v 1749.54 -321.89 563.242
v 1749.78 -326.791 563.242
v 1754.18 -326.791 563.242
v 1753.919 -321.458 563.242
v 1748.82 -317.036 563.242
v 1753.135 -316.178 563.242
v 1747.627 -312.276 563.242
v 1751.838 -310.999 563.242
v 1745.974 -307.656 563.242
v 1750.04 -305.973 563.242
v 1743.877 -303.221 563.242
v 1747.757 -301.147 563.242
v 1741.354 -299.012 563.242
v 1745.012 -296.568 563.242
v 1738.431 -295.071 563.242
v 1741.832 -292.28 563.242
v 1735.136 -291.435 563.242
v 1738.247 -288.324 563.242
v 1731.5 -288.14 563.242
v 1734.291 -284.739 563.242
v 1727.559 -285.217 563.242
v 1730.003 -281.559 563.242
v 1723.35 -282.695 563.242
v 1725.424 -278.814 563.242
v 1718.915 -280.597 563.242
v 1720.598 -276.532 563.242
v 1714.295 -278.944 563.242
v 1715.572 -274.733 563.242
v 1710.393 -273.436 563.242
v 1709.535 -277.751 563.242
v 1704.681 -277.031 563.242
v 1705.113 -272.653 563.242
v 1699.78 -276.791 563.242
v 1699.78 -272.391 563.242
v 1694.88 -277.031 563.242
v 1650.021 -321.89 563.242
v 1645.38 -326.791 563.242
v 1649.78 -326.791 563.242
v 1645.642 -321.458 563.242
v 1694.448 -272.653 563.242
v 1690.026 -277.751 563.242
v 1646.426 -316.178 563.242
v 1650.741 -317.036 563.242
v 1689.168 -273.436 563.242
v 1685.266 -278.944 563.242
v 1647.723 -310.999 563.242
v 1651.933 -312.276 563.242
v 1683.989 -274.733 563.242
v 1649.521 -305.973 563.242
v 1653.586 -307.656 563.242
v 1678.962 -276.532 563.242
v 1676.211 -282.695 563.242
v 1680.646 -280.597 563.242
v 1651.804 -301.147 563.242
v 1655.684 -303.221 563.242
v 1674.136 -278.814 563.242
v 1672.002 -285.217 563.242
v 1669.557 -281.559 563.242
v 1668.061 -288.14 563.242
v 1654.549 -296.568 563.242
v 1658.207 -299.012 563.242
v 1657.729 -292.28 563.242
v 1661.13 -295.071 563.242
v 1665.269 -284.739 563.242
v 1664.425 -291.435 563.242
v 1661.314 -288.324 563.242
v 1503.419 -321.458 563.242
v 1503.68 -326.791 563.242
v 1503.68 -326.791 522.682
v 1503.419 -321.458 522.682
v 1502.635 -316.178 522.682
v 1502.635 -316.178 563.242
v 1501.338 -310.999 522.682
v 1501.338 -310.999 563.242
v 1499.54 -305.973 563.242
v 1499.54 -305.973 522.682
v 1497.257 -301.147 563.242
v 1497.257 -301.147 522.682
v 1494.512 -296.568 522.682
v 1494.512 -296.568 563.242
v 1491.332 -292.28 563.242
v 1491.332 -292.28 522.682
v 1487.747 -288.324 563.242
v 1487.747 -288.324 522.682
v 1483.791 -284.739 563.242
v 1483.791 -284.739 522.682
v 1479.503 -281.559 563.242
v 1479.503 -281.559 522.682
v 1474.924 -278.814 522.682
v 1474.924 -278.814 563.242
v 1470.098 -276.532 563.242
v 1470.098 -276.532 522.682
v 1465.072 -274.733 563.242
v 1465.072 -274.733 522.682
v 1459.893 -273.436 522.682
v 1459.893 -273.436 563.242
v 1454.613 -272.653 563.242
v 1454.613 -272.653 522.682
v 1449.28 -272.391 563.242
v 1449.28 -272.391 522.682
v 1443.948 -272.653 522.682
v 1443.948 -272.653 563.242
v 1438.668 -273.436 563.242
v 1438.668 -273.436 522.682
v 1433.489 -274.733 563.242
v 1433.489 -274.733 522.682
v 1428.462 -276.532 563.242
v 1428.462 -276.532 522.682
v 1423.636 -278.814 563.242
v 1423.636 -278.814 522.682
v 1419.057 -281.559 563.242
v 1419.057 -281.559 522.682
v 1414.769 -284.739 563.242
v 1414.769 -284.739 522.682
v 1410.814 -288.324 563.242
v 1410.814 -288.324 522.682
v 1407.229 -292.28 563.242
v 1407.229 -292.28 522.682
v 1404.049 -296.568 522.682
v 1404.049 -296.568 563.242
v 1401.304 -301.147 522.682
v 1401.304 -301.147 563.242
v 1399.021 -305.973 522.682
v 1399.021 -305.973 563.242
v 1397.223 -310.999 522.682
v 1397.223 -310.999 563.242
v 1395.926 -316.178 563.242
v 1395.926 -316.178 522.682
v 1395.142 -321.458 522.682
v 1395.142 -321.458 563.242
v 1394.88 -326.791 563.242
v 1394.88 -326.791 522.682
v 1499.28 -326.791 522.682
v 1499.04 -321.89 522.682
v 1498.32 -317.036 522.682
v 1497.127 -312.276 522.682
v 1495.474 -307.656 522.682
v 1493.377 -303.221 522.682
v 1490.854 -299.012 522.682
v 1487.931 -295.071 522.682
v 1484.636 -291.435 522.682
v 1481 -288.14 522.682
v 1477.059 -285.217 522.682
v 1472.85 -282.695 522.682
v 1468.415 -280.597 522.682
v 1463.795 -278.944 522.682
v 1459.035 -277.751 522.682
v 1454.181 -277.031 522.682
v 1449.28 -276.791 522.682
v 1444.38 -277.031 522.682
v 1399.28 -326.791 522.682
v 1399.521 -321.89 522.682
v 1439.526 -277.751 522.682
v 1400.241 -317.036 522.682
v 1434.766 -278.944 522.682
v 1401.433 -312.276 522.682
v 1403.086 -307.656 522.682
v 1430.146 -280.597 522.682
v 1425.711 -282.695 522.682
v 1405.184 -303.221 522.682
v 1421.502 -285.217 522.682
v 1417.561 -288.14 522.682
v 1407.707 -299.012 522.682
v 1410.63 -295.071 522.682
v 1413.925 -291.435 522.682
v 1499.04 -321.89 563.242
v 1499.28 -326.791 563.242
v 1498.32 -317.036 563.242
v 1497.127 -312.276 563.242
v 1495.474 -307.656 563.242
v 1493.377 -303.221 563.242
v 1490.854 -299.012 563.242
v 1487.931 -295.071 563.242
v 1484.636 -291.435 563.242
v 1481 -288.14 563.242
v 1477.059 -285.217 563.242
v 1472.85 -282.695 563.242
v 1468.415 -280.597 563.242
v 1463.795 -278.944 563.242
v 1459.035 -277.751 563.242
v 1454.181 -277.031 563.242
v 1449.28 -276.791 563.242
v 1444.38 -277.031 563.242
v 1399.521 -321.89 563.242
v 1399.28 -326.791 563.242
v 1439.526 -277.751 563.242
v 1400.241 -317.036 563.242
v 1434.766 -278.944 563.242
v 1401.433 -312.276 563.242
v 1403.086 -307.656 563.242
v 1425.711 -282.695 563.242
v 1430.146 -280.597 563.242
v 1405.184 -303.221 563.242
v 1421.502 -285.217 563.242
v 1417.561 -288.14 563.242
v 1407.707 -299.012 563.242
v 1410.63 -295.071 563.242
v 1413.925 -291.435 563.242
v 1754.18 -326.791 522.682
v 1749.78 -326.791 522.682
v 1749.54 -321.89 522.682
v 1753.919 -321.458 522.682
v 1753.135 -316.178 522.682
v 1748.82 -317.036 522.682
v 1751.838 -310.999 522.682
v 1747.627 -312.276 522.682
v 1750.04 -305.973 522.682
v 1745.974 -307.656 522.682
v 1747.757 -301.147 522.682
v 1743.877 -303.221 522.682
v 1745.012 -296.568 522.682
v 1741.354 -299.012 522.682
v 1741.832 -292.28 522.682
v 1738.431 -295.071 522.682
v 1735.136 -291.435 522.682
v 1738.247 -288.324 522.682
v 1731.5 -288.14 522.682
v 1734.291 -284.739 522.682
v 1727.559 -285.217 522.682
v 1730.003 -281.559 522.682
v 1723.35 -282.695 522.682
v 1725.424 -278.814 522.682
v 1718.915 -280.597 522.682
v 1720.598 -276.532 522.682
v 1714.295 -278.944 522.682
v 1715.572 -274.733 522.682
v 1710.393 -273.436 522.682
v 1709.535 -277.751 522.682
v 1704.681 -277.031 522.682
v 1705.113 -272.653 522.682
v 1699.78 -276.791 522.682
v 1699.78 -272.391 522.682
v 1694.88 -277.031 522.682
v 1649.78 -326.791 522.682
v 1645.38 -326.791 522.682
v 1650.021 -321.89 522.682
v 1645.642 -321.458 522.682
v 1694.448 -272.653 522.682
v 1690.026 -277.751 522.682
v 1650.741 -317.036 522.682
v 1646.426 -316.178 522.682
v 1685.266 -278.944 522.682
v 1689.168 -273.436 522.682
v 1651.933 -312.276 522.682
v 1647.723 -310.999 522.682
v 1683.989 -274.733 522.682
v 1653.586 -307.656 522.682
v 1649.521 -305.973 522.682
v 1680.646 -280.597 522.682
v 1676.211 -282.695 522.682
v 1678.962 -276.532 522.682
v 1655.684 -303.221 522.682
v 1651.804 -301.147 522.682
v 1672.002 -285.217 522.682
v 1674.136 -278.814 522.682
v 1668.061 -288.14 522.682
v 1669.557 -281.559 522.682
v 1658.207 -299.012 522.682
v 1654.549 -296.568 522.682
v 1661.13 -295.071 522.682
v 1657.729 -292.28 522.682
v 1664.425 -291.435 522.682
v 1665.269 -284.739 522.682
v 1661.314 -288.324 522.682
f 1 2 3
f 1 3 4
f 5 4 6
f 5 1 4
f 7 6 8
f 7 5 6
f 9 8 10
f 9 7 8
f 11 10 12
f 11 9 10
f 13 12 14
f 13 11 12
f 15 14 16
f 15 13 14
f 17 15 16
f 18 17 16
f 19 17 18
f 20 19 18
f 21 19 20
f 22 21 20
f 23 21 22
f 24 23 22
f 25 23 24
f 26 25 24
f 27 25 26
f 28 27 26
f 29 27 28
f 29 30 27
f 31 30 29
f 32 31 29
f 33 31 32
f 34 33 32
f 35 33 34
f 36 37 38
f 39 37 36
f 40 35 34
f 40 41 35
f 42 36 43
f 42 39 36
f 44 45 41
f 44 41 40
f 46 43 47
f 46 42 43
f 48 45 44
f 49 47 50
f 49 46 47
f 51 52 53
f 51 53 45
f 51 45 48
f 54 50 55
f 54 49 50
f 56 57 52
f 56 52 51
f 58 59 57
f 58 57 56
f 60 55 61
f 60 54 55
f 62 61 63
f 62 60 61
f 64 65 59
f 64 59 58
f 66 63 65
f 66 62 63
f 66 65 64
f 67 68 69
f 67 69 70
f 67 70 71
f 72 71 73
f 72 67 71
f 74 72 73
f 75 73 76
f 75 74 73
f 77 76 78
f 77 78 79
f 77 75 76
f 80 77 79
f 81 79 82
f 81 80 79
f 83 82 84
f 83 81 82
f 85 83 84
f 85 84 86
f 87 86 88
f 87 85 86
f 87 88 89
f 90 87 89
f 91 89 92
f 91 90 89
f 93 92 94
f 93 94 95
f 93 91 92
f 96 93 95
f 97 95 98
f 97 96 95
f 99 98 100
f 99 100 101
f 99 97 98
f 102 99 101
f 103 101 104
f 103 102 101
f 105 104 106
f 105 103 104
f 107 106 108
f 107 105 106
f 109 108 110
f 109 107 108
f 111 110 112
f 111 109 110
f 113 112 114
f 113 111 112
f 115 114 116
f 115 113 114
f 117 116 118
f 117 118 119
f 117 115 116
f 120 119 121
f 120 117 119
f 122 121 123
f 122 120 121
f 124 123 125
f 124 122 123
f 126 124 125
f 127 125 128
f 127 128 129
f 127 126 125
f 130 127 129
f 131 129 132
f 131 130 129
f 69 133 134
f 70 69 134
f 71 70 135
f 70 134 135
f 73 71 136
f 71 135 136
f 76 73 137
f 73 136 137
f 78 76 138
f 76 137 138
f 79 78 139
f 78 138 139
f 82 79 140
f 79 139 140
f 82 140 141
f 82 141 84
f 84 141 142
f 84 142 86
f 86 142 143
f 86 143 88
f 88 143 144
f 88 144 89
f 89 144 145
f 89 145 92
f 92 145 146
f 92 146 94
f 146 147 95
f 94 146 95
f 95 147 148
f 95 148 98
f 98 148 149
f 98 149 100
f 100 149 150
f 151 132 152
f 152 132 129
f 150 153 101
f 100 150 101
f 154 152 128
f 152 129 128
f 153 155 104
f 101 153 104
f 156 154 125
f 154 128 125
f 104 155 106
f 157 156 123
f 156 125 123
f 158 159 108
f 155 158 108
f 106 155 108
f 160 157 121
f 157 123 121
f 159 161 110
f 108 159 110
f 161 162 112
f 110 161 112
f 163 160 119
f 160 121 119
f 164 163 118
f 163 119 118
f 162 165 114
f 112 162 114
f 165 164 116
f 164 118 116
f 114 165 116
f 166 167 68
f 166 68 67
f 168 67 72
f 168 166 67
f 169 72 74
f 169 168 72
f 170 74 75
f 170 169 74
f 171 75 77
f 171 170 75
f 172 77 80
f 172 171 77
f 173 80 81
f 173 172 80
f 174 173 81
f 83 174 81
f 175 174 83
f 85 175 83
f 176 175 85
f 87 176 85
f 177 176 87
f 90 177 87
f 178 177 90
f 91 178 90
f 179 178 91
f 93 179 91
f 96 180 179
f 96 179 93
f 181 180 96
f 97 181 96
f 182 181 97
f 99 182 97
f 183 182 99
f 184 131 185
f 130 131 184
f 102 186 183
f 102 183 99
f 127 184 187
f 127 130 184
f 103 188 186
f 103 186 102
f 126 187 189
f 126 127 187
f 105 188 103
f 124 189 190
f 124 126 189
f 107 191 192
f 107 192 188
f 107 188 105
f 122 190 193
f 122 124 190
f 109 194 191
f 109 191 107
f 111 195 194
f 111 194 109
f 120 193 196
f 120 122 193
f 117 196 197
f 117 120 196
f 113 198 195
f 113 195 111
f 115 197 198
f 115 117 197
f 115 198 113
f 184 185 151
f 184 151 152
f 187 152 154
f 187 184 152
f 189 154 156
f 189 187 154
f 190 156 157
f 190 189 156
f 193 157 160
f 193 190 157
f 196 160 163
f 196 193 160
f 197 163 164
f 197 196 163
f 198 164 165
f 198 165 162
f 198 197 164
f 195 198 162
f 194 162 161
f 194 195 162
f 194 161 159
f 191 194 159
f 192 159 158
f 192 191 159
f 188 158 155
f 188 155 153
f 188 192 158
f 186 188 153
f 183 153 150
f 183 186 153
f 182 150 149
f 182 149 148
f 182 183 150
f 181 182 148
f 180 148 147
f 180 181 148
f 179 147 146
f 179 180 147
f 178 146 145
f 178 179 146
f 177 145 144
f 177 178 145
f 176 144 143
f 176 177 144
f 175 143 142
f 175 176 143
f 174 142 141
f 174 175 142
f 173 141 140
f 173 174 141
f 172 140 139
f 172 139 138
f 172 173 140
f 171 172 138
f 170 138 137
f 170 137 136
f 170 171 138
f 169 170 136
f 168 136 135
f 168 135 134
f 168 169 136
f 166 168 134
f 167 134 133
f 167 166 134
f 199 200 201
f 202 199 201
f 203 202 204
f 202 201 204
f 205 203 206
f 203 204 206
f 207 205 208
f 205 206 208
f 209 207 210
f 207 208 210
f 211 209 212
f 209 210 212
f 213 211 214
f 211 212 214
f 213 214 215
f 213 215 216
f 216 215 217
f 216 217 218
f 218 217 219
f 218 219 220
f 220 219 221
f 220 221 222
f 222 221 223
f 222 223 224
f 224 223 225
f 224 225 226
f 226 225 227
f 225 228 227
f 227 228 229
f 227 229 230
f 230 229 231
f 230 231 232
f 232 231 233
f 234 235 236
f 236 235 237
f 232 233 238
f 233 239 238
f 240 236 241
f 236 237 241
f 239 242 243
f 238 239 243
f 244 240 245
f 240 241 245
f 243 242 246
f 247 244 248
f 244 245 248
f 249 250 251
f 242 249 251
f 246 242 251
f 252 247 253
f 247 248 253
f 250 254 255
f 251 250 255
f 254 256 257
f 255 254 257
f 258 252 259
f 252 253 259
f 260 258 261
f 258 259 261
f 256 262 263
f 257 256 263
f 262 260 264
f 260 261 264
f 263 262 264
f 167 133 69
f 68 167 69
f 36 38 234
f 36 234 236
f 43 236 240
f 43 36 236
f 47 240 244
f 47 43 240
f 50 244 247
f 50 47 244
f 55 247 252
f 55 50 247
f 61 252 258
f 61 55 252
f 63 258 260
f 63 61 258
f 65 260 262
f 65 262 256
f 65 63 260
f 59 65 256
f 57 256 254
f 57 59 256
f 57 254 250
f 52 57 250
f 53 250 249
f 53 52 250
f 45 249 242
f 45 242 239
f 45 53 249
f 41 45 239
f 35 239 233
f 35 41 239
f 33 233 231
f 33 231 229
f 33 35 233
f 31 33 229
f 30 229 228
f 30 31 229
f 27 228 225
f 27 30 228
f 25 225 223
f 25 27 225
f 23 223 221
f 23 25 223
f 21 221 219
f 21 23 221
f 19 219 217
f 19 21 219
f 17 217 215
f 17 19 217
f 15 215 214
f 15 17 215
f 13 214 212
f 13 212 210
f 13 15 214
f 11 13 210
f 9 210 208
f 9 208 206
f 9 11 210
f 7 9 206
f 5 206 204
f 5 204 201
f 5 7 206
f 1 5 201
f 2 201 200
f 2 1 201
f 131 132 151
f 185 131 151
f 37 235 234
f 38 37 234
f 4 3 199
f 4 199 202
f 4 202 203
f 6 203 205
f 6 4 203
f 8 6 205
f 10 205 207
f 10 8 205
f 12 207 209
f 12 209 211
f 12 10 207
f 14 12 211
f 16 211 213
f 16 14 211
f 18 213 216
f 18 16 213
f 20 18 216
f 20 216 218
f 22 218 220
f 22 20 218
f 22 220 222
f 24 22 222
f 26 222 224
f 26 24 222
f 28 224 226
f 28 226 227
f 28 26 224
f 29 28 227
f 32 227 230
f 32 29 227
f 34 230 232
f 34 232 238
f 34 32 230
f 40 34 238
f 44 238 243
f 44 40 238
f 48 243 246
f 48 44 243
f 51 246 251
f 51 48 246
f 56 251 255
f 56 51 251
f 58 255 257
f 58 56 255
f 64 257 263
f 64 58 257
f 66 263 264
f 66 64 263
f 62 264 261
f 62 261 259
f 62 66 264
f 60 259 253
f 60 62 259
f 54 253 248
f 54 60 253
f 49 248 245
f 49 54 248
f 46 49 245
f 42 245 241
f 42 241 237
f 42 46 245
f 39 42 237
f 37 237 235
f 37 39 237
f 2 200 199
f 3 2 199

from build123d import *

# Parameters (mm, degrees)
BOSS_EXTRUDE1_DEPTH   = 40.56
BOSS_EXTRUDE1_2_DEPTH = 40.56


with BuildPart() as part:
    # Sketch1 → Boss-Extrude1 (new body)
    with BuildSketch(Plane(origin=(0, 0, 563.242336202), x_dir=(0, -1, 0), z_dir=(0, 0, -1))):
        with BuildLine():
            Line((326.790615215, -1394.880472759), (326.790615215, -1399.280472759))
            ThreePointArc((326.790615215, -1399.280472759), (276.790615215, -1449.280472759), (326.790615215, -1499.280472759))
            Line((326.790615215, -1499.280472759), (326.790615215, -1503.680472759))
            ThreePointArc((326.790615215, -1503.680472759), (272.390615215, -1449.280472759), (326.790615215, -1394.880472759))
        make_face()
    extrude(amount=BOSS_EXTRUDE1_DEPTH)


with BuildPart() as body_2:
    # Sketch1 → Boss-Extrude1 2 (new body)
    with BuildSketch(Plane(origin=(0, 0, 563.242336202), x_dir=(0, -1, 0), z_dir=(0, 0, -1))):
        with BuildLine():
            Line((326.790615215, -1749.780472759), (326.790615215, -1754.180472759))
            ThreePointArc((326.790615215, -1754.180472759), (272.390615215, -1699.780472759), (326.790615215, -1645.380472759))
            Line((326.790615215, -1645.380472759), (326.790615215, -1649.780472759))
            ThreePointArc((326.790615215, -1649.780472759), (276.790615215, -1699.780472759), (326.790615215, -1749.780472759))
        make_face()
    extrude(amount=BOSS_EXTRUDE1_2_DEPTH)


solid = Compound([part.part, body_2.part])
